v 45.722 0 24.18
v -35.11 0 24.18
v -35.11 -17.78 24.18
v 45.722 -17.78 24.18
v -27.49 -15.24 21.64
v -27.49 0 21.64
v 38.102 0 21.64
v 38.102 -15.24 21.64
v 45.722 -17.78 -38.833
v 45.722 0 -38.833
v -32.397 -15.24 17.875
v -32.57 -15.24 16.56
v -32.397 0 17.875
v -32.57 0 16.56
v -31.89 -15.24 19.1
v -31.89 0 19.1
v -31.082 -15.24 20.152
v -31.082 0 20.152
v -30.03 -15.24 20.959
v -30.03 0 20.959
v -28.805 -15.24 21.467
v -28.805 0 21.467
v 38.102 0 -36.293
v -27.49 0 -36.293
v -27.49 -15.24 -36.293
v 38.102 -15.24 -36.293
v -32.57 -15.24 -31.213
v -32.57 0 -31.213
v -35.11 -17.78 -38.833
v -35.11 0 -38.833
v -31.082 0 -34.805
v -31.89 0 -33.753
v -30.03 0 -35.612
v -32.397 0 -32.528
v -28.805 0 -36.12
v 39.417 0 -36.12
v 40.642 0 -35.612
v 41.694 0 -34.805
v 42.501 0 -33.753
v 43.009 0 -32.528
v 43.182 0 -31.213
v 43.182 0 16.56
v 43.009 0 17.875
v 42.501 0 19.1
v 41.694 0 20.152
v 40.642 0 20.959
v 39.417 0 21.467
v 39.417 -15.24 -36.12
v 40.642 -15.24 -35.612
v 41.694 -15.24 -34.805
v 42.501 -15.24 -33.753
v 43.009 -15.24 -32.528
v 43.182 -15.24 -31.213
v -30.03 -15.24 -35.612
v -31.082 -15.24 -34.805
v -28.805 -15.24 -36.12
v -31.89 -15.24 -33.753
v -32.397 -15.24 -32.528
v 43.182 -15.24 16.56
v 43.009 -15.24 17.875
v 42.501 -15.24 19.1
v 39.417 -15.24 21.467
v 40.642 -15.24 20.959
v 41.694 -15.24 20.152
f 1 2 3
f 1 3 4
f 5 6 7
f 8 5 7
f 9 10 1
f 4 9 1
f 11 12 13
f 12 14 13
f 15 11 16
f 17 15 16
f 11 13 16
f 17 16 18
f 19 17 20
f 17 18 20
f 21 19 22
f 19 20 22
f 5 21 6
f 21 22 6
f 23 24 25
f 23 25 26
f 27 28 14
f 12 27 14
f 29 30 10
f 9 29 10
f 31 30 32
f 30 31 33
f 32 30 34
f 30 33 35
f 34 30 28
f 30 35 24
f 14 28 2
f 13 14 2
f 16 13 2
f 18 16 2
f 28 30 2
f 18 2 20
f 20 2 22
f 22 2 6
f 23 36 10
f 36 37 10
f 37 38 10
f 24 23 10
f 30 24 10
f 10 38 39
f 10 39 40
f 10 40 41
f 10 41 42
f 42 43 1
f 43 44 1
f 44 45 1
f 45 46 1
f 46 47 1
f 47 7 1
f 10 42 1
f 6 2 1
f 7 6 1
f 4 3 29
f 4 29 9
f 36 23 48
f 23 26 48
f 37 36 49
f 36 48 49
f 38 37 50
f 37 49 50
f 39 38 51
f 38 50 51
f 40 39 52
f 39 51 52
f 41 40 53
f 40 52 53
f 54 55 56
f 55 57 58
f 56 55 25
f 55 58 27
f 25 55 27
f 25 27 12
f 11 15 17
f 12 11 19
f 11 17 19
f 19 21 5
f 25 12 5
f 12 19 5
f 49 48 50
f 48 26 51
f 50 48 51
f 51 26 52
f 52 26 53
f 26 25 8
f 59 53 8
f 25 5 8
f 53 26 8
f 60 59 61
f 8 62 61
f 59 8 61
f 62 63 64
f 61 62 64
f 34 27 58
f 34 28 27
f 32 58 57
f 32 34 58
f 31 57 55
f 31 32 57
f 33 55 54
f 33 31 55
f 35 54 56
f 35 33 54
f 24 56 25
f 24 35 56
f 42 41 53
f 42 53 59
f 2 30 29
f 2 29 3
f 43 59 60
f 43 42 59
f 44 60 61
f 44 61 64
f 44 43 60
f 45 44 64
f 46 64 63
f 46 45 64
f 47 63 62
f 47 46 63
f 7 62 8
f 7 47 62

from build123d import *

# Parameters (mm, degrees)
F0_W     = 80.8320604265
F0_H     = 63.012579456
F1_DEPTH = 17.78
F2_T     = -2.54
F3_R     = 5.08


with BuildPart() as f1:
    # F0 (on Front) → F1 (new body)
    with BuildSketch(Plane.XZ):
        with Locations((5.305705592, -7.3265088722)):
            Rectangle(F0_W, F0_H)
    extrude(amount=F1_DEPTH)

    # F2
    f2_openings = [f1.faces().sort_by_distance(p)[0] for p in [
        (5.305706, 0, -7.326509),
    ]]
    offset(amount=F2_T, openings=f2_openings)

    # F3
    f3_edges = [f1.edges().sort_by_distance(p)[0] for p in [
        (-32.570325, -7.62, 21.639781),
        (43.181736, -7.62, 21.639781),
        (43.181736, -7.62, -36.292799),
        (-32.570325, -7.62, -36.292799),
    ]]
    fillet(f3_edges, radius=F3_R)


solid = f1.part
